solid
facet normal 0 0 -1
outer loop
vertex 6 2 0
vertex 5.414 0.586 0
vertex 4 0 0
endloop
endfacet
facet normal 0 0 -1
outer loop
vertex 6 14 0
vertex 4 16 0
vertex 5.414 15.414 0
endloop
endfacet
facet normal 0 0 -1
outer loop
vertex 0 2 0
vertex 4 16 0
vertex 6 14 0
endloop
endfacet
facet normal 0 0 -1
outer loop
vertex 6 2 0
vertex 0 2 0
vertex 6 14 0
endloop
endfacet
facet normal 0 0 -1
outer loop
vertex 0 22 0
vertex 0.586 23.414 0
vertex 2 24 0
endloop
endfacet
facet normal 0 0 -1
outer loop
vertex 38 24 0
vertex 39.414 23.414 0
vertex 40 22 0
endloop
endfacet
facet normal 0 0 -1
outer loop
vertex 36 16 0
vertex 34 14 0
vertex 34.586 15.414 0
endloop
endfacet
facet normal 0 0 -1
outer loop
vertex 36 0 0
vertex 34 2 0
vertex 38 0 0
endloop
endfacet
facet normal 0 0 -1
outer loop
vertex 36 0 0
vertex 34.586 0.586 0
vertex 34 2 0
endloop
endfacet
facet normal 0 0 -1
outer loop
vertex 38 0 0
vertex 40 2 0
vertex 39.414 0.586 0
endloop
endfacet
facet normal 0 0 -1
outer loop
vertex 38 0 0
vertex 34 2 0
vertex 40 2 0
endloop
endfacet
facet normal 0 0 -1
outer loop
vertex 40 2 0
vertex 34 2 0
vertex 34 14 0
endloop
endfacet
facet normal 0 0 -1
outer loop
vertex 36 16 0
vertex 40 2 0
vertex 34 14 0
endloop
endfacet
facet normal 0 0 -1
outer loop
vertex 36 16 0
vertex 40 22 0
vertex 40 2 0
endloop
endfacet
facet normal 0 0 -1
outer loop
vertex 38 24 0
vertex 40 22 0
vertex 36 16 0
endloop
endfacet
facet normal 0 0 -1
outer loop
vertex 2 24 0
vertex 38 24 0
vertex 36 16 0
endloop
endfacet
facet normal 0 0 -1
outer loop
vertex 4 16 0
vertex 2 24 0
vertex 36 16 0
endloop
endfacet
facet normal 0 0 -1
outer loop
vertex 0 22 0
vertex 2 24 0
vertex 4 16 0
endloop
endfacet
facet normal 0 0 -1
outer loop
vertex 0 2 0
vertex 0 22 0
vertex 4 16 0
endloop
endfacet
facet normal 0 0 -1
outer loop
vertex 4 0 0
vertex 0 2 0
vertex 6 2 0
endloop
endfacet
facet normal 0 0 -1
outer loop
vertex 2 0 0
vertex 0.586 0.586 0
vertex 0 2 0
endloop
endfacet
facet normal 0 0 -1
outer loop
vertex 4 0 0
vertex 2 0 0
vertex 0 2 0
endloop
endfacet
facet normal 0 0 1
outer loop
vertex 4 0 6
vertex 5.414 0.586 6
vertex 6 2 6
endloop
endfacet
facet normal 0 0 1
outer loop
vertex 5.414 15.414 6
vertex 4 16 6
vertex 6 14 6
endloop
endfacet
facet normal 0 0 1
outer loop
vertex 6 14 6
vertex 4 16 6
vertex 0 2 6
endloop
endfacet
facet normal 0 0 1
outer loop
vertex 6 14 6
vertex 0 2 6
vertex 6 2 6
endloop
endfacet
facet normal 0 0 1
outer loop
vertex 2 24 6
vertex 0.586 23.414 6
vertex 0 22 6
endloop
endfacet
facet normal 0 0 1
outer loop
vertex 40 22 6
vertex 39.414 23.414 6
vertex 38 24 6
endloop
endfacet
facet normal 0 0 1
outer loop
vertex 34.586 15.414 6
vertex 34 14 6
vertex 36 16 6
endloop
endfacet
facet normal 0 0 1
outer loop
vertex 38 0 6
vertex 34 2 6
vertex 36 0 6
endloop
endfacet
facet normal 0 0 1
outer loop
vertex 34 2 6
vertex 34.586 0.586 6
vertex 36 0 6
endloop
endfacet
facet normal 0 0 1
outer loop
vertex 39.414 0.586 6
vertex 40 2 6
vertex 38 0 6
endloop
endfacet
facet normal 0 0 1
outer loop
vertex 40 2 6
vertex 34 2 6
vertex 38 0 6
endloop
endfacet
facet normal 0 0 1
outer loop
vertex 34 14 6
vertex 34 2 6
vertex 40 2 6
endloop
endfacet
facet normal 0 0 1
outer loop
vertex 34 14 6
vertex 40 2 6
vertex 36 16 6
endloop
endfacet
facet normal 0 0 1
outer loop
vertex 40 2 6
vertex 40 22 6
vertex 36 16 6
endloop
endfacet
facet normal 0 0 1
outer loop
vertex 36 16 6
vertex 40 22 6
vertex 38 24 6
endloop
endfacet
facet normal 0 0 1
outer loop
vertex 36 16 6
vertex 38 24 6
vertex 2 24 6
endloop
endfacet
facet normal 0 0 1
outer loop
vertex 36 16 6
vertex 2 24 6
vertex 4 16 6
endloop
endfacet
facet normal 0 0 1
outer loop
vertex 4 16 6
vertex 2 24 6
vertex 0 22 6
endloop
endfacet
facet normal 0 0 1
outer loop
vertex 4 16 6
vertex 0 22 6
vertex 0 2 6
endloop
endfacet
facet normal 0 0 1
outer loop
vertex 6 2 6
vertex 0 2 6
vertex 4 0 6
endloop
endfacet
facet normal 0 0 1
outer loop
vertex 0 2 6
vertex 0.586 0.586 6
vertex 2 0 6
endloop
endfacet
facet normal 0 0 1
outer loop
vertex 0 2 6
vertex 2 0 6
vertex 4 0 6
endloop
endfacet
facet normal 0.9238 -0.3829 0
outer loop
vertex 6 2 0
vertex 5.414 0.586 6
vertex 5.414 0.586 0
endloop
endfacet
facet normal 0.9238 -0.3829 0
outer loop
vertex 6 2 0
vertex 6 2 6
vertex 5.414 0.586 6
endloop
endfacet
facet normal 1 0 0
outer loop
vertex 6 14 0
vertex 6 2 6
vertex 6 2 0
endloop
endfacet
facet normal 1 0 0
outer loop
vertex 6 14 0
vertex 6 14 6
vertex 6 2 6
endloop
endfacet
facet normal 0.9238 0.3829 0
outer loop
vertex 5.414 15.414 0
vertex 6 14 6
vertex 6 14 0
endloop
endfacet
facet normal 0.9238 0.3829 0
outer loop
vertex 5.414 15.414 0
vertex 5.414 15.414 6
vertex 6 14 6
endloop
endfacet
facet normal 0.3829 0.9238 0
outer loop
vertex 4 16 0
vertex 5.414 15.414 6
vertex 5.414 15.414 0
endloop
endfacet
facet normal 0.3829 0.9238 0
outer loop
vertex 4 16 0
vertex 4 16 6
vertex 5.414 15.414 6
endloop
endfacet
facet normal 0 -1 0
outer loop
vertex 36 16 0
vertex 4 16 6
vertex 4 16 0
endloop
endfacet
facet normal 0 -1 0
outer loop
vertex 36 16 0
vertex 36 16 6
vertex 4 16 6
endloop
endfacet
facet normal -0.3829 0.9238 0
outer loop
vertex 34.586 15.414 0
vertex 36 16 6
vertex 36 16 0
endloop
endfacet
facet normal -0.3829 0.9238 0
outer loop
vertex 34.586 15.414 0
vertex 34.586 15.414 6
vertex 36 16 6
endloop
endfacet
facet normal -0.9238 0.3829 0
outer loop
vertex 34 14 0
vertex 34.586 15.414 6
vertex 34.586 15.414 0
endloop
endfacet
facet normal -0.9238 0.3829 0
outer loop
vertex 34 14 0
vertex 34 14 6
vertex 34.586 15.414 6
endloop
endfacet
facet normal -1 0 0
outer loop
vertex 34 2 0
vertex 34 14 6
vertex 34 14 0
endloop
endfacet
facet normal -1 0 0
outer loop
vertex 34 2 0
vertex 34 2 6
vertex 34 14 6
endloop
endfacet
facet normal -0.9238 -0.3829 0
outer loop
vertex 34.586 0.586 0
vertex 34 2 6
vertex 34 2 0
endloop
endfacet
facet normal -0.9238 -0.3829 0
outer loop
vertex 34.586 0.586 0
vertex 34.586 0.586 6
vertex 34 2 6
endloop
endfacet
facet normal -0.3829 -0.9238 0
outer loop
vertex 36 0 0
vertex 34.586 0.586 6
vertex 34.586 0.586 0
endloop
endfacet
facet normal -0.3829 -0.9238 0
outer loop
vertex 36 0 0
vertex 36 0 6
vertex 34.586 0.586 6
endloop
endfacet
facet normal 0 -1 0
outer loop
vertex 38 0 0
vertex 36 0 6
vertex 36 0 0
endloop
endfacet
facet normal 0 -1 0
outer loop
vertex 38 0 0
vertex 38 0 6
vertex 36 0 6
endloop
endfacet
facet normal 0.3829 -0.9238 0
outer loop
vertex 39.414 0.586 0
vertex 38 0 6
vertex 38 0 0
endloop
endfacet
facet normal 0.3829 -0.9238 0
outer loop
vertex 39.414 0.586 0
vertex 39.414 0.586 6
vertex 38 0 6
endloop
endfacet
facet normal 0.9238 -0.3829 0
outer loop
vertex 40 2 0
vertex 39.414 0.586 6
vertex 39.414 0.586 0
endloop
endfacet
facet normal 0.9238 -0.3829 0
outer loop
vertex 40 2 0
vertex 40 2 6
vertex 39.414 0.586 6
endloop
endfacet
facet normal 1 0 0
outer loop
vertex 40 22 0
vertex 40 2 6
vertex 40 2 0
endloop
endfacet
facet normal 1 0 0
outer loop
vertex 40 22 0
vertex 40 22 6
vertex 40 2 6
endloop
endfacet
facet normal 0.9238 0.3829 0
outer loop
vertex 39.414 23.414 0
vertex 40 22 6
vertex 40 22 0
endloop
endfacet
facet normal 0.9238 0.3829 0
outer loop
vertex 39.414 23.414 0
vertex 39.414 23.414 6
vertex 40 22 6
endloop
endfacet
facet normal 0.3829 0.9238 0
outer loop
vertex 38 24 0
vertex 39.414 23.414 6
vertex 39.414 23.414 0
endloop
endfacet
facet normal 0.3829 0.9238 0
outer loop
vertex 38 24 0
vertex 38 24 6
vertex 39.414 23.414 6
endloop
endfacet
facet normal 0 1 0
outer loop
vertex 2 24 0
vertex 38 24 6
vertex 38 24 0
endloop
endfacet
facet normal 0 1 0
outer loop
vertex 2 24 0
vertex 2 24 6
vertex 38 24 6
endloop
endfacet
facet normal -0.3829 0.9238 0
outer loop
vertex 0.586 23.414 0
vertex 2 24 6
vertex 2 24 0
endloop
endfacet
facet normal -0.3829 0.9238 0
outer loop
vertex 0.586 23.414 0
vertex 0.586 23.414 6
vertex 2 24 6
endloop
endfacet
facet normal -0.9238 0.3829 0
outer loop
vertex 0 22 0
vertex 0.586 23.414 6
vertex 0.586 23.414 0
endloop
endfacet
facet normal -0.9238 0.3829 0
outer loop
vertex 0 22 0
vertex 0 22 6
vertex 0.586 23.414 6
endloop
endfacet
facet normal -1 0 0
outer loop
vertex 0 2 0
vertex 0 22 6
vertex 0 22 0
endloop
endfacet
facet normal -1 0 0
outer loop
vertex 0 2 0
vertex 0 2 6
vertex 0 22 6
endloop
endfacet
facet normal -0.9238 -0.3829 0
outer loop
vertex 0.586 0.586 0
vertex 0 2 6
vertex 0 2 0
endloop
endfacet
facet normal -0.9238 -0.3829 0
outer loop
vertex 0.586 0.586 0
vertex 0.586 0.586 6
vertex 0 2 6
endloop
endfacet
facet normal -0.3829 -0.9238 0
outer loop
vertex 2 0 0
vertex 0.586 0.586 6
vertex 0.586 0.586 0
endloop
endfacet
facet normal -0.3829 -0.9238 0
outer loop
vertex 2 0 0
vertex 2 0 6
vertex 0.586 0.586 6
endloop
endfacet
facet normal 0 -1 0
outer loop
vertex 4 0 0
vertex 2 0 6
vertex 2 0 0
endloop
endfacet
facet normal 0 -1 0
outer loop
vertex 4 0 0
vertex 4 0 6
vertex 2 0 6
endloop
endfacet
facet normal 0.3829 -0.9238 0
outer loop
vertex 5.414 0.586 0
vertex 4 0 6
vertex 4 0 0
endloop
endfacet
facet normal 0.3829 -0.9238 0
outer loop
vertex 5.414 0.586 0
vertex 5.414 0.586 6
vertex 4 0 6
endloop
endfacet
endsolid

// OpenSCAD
$fn = 32;

// ----------------------------------------------------------------------
// Clip blank: staple clip, 6 mm thick
// ----------------------------------------------------------------------

// --- parameters (mm) ---
profile_height = 6;       // extrusion height
profile_points = 24;      // points of the closed outline

profile = [[0, 2], [0.586, 0.586], [2, 0], [4, 0], [5.414, 0.586], [6, 2], [6, 14], [5.414, 15.414], [4, 16], [36, 16], [34.586, 15.414], [34, 14], [34, 2], [34.586, 0.586], [36, 0], [38, 0], [39.414, 0.586], [40, 2], [40, 22], [39.414, 23.414], [38, 24], [2, 24], [0.586, 23.414], [0, 22]];  // single closed polygon, 24 points, counter clockwise

// --- the one profile operation ---
linear_extrude(height = profile_height) polygon(points = profile);
